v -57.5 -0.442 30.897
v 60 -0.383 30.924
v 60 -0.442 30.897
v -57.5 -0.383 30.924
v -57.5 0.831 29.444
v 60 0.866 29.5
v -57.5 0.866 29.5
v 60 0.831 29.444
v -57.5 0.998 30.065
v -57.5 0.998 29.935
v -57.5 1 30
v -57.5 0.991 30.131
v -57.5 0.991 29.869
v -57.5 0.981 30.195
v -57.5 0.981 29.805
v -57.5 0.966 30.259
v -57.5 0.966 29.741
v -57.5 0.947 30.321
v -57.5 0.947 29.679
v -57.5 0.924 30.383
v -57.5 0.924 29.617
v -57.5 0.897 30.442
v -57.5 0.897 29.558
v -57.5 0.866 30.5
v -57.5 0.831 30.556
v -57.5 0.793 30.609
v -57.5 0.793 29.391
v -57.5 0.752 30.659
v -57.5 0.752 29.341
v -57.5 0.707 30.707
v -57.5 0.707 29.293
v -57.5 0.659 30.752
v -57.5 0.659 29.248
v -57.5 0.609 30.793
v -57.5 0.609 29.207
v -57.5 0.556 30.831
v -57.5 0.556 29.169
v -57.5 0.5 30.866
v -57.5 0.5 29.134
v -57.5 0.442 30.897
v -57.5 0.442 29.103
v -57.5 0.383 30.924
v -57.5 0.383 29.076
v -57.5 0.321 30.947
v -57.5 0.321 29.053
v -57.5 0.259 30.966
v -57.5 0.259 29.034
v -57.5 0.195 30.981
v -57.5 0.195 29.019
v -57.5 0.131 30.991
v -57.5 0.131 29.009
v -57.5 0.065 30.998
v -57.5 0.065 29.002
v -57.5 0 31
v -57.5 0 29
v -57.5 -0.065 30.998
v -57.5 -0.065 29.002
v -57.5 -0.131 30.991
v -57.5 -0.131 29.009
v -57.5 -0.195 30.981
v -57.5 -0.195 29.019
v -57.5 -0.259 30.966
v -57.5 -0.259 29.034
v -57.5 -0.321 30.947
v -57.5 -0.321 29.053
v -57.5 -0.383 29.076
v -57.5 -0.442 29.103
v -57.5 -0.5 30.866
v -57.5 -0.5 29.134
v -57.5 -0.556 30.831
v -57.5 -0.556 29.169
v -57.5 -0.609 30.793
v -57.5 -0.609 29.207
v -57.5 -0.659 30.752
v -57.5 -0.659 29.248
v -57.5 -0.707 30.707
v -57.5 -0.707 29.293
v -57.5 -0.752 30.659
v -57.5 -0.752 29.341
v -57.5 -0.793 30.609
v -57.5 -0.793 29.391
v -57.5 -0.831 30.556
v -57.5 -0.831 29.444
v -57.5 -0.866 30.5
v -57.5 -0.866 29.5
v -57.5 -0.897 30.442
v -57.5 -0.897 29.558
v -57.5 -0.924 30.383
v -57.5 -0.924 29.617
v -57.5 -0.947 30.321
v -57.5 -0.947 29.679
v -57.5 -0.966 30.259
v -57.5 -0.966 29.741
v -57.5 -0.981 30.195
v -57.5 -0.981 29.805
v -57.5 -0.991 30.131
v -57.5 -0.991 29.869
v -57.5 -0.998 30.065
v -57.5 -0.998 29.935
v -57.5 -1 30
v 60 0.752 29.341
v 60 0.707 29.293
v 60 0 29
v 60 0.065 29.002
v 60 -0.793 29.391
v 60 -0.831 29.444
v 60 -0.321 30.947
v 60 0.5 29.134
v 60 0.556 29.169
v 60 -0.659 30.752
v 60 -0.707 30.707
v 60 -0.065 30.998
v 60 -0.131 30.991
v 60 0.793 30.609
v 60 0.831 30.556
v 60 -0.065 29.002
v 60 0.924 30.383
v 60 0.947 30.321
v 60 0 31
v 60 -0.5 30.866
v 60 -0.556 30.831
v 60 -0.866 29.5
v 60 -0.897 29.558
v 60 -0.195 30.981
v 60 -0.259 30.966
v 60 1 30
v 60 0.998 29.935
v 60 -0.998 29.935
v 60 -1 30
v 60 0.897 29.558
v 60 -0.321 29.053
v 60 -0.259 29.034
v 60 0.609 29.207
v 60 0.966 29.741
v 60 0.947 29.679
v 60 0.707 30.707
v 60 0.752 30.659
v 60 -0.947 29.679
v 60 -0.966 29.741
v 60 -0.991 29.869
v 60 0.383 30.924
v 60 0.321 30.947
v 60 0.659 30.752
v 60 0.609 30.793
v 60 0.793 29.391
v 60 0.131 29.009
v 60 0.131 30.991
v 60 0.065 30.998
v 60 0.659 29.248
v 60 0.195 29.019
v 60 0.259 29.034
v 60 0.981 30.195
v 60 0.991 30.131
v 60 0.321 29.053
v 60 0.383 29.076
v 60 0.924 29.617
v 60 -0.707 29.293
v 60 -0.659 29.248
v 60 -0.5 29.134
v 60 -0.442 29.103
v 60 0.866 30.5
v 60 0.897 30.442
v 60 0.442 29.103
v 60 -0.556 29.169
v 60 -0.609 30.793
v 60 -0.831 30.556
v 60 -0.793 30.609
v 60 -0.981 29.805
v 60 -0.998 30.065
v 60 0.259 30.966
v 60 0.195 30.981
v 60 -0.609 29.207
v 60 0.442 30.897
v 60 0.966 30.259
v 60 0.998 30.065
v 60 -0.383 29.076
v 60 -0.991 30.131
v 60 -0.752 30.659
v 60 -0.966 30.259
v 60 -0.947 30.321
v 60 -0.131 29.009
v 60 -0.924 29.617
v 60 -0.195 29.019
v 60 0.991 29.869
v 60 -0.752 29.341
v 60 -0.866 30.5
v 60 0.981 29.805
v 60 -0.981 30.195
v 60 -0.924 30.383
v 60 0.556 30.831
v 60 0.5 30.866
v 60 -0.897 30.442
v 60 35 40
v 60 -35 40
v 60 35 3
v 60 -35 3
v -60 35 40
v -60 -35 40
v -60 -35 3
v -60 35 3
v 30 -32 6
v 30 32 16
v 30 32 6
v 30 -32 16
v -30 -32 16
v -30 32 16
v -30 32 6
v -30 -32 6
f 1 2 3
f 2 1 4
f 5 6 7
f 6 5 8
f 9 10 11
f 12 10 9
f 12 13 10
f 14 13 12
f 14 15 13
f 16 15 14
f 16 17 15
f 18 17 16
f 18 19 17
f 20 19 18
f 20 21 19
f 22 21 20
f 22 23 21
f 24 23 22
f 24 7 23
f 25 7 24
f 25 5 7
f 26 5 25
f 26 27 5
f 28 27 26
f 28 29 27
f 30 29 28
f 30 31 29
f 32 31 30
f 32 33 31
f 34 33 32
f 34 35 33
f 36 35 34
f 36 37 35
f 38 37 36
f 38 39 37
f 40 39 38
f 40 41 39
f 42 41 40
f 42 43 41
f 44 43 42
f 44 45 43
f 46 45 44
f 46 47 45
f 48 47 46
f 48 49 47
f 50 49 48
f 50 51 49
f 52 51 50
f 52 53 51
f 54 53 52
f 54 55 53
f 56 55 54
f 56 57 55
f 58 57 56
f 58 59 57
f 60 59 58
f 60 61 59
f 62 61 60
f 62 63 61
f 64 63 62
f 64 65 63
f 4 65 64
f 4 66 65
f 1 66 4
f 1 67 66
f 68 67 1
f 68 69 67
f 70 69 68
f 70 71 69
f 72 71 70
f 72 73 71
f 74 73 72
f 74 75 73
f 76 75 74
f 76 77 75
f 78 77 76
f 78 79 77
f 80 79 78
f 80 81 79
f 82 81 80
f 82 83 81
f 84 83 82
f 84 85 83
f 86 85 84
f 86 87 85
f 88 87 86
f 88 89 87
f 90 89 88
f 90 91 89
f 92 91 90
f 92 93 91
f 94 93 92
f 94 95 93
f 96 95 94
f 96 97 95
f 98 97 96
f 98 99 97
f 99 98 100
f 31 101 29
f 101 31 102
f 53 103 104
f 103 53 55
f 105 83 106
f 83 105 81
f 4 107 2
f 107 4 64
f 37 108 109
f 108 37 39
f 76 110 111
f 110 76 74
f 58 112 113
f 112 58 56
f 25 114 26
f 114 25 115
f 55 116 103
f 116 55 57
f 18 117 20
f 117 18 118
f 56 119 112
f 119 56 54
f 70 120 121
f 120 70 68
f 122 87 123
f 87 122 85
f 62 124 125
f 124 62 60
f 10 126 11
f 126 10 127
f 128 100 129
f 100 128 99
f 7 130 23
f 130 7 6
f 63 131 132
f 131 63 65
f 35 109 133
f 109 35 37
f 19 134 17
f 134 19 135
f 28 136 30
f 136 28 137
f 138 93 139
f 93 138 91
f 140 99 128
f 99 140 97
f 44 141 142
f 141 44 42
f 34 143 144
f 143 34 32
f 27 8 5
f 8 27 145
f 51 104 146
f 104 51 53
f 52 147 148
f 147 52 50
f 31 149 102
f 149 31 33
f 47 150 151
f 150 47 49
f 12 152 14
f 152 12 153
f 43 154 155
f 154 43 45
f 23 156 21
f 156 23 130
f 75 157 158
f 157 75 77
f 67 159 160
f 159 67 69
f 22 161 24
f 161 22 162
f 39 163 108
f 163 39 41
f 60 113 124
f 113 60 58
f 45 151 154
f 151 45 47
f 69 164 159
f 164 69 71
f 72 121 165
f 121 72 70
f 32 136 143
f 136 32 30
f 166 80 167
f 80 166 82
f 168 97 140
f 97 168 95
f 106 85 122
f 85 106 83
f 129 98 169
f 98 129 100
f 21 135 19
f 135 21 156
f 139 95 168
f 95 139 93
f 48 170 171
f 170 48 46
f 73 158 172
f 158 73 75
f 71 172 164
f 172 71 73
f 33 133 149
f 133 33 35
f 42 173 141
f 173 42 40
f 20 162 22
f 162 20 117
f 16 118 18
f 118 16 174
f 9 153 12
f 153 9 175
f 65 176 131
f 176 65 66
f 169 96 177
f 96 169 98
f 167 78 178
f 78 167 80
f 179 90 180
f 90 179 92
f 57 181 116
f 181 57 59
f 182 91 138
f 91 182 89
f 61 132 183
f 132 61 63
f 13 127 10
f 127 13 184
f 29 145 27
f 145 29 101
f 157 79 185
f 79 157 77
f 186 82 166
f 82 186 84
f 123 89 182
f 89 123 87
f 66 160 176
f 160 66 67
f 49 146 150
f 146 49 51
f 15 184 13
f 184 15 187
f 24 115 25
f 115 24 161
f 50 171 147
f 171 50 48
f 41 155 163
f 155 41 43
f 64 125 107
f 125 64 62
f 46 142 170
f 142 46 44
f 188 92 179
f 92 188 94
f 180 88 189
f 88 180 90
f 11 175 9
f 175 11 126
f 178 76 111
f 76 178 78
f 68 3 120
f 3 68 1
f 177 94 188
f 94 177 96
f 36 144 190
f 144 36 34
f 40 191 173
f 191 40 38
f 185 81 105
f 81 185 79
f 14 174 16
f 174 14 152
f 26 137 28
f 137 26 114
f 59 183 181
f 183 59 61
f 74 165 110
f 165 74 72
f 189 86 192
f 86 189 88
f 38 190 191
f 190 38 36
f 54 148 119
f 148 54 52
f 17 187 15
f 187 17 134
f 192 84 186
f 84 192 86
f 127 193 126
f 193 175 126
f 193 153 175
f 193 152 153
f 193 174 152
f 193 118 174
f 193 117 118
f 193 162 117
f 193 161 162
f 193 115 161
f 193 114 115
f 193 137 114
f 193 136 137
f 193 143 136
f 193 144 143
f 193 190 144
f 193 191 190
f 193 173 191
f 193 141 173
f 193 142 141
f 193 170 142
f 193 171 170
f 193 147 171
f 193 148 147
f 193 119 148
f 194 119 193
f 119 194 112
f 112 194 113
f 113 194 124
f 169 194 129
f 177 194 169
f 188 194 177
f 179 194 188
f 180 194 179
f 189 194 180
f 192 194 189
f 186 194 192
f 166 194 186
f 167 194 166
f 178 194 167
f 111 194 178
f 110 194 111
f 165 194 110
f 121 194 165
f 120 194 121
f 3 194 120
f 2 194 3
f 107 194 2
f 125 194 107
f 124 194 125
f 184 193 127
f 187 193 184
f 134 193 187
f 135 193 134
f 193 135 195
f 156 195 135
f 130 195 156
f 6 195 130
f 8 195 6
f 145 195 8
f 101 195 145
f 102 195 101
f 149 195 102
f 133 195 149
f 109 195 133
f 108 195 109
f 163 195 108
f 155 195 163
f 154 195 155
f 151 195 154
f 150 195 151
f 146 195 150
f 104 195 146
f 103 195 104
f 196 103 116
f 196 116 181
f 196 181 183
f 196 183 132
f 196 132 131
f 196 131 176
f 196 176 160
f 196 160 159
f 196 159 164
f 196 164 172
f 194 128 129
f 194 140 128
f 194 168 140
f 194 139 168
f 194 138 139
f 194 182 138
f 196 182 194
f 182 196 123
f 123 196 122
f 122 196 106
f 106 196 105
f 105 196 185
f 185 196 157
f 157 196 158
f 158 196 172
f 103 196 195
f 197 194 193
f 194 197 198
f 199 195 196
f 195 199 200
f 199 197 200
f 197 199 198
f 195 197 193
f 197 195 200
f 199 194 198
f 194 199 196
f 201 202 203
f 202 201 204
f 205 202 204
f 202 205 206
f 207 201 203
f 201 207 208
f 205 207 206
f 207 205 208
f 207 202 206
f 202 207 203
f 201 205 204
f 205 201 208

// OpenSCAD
// Mini horizontal gel-electrophoresis box - buffer tank
// Print orientation: tank rests on XY plane, open top facing up (+Z)

// ---------------- Parameters ----------------
tank_x      = 120;   // outer length along X (mm)
tank_y      = 70;    // outer width along Y (mm)
tank_h      = 40;    // outer height along Z (mm)

wall        = 3;     // wall thickness (mm)
floor       = 3;     // floor thickness (mm)

platform_x  = 60;    // platform length along X (mm), centred
platform_z  = 10;    // platform top height above inner floor (mm)

hole_d      = 2;     // electrode hole diameter (mm)
hole_y      = 0;     // electrode hole Y position (mm)
hole_z      = 30;    // electrode hole Z position (mm)

eps         = 0.5;   // cutter overshoot past faces (mm)
$fn         = 96;    // curve resolution

// ---------------- Derived ----------------
inner_x = tank_x - 2 * wall;          // inner length
inner_y = tank_y - 2 * wall;          // inner width
inner_h = tank_h - floor;             // inner height (open top)
floor_z = floor;                      // floor bottom height (z = 3)
platform_t = platform_z;              // platform thickness above floor (10)

// ---------------- Model ----------------
difference() {
    // Main tank body
    translate([-tank_x/2, -tank_y/2, floor_z])
        cube([tank_x, tank_y, tank_h - floor]);

    // Central raised platform (spans full inner width Y)
    translate([-platform_x/2, -inner_y/2, floor_z + floor])
        cube([platform_x, inner_y, platform_t]);

    // Horizontal electrode holes through each end wall, along X
    for (sx = [-1, 1])
        translate([sx > 0 ? inner_x/2 - eps : -inner_x/2 - eps, hole_y, hole_z])
            rotate([0, 90, 0])
                cylinder(d = hole_d, h = tank_x + 2*eps);
}
